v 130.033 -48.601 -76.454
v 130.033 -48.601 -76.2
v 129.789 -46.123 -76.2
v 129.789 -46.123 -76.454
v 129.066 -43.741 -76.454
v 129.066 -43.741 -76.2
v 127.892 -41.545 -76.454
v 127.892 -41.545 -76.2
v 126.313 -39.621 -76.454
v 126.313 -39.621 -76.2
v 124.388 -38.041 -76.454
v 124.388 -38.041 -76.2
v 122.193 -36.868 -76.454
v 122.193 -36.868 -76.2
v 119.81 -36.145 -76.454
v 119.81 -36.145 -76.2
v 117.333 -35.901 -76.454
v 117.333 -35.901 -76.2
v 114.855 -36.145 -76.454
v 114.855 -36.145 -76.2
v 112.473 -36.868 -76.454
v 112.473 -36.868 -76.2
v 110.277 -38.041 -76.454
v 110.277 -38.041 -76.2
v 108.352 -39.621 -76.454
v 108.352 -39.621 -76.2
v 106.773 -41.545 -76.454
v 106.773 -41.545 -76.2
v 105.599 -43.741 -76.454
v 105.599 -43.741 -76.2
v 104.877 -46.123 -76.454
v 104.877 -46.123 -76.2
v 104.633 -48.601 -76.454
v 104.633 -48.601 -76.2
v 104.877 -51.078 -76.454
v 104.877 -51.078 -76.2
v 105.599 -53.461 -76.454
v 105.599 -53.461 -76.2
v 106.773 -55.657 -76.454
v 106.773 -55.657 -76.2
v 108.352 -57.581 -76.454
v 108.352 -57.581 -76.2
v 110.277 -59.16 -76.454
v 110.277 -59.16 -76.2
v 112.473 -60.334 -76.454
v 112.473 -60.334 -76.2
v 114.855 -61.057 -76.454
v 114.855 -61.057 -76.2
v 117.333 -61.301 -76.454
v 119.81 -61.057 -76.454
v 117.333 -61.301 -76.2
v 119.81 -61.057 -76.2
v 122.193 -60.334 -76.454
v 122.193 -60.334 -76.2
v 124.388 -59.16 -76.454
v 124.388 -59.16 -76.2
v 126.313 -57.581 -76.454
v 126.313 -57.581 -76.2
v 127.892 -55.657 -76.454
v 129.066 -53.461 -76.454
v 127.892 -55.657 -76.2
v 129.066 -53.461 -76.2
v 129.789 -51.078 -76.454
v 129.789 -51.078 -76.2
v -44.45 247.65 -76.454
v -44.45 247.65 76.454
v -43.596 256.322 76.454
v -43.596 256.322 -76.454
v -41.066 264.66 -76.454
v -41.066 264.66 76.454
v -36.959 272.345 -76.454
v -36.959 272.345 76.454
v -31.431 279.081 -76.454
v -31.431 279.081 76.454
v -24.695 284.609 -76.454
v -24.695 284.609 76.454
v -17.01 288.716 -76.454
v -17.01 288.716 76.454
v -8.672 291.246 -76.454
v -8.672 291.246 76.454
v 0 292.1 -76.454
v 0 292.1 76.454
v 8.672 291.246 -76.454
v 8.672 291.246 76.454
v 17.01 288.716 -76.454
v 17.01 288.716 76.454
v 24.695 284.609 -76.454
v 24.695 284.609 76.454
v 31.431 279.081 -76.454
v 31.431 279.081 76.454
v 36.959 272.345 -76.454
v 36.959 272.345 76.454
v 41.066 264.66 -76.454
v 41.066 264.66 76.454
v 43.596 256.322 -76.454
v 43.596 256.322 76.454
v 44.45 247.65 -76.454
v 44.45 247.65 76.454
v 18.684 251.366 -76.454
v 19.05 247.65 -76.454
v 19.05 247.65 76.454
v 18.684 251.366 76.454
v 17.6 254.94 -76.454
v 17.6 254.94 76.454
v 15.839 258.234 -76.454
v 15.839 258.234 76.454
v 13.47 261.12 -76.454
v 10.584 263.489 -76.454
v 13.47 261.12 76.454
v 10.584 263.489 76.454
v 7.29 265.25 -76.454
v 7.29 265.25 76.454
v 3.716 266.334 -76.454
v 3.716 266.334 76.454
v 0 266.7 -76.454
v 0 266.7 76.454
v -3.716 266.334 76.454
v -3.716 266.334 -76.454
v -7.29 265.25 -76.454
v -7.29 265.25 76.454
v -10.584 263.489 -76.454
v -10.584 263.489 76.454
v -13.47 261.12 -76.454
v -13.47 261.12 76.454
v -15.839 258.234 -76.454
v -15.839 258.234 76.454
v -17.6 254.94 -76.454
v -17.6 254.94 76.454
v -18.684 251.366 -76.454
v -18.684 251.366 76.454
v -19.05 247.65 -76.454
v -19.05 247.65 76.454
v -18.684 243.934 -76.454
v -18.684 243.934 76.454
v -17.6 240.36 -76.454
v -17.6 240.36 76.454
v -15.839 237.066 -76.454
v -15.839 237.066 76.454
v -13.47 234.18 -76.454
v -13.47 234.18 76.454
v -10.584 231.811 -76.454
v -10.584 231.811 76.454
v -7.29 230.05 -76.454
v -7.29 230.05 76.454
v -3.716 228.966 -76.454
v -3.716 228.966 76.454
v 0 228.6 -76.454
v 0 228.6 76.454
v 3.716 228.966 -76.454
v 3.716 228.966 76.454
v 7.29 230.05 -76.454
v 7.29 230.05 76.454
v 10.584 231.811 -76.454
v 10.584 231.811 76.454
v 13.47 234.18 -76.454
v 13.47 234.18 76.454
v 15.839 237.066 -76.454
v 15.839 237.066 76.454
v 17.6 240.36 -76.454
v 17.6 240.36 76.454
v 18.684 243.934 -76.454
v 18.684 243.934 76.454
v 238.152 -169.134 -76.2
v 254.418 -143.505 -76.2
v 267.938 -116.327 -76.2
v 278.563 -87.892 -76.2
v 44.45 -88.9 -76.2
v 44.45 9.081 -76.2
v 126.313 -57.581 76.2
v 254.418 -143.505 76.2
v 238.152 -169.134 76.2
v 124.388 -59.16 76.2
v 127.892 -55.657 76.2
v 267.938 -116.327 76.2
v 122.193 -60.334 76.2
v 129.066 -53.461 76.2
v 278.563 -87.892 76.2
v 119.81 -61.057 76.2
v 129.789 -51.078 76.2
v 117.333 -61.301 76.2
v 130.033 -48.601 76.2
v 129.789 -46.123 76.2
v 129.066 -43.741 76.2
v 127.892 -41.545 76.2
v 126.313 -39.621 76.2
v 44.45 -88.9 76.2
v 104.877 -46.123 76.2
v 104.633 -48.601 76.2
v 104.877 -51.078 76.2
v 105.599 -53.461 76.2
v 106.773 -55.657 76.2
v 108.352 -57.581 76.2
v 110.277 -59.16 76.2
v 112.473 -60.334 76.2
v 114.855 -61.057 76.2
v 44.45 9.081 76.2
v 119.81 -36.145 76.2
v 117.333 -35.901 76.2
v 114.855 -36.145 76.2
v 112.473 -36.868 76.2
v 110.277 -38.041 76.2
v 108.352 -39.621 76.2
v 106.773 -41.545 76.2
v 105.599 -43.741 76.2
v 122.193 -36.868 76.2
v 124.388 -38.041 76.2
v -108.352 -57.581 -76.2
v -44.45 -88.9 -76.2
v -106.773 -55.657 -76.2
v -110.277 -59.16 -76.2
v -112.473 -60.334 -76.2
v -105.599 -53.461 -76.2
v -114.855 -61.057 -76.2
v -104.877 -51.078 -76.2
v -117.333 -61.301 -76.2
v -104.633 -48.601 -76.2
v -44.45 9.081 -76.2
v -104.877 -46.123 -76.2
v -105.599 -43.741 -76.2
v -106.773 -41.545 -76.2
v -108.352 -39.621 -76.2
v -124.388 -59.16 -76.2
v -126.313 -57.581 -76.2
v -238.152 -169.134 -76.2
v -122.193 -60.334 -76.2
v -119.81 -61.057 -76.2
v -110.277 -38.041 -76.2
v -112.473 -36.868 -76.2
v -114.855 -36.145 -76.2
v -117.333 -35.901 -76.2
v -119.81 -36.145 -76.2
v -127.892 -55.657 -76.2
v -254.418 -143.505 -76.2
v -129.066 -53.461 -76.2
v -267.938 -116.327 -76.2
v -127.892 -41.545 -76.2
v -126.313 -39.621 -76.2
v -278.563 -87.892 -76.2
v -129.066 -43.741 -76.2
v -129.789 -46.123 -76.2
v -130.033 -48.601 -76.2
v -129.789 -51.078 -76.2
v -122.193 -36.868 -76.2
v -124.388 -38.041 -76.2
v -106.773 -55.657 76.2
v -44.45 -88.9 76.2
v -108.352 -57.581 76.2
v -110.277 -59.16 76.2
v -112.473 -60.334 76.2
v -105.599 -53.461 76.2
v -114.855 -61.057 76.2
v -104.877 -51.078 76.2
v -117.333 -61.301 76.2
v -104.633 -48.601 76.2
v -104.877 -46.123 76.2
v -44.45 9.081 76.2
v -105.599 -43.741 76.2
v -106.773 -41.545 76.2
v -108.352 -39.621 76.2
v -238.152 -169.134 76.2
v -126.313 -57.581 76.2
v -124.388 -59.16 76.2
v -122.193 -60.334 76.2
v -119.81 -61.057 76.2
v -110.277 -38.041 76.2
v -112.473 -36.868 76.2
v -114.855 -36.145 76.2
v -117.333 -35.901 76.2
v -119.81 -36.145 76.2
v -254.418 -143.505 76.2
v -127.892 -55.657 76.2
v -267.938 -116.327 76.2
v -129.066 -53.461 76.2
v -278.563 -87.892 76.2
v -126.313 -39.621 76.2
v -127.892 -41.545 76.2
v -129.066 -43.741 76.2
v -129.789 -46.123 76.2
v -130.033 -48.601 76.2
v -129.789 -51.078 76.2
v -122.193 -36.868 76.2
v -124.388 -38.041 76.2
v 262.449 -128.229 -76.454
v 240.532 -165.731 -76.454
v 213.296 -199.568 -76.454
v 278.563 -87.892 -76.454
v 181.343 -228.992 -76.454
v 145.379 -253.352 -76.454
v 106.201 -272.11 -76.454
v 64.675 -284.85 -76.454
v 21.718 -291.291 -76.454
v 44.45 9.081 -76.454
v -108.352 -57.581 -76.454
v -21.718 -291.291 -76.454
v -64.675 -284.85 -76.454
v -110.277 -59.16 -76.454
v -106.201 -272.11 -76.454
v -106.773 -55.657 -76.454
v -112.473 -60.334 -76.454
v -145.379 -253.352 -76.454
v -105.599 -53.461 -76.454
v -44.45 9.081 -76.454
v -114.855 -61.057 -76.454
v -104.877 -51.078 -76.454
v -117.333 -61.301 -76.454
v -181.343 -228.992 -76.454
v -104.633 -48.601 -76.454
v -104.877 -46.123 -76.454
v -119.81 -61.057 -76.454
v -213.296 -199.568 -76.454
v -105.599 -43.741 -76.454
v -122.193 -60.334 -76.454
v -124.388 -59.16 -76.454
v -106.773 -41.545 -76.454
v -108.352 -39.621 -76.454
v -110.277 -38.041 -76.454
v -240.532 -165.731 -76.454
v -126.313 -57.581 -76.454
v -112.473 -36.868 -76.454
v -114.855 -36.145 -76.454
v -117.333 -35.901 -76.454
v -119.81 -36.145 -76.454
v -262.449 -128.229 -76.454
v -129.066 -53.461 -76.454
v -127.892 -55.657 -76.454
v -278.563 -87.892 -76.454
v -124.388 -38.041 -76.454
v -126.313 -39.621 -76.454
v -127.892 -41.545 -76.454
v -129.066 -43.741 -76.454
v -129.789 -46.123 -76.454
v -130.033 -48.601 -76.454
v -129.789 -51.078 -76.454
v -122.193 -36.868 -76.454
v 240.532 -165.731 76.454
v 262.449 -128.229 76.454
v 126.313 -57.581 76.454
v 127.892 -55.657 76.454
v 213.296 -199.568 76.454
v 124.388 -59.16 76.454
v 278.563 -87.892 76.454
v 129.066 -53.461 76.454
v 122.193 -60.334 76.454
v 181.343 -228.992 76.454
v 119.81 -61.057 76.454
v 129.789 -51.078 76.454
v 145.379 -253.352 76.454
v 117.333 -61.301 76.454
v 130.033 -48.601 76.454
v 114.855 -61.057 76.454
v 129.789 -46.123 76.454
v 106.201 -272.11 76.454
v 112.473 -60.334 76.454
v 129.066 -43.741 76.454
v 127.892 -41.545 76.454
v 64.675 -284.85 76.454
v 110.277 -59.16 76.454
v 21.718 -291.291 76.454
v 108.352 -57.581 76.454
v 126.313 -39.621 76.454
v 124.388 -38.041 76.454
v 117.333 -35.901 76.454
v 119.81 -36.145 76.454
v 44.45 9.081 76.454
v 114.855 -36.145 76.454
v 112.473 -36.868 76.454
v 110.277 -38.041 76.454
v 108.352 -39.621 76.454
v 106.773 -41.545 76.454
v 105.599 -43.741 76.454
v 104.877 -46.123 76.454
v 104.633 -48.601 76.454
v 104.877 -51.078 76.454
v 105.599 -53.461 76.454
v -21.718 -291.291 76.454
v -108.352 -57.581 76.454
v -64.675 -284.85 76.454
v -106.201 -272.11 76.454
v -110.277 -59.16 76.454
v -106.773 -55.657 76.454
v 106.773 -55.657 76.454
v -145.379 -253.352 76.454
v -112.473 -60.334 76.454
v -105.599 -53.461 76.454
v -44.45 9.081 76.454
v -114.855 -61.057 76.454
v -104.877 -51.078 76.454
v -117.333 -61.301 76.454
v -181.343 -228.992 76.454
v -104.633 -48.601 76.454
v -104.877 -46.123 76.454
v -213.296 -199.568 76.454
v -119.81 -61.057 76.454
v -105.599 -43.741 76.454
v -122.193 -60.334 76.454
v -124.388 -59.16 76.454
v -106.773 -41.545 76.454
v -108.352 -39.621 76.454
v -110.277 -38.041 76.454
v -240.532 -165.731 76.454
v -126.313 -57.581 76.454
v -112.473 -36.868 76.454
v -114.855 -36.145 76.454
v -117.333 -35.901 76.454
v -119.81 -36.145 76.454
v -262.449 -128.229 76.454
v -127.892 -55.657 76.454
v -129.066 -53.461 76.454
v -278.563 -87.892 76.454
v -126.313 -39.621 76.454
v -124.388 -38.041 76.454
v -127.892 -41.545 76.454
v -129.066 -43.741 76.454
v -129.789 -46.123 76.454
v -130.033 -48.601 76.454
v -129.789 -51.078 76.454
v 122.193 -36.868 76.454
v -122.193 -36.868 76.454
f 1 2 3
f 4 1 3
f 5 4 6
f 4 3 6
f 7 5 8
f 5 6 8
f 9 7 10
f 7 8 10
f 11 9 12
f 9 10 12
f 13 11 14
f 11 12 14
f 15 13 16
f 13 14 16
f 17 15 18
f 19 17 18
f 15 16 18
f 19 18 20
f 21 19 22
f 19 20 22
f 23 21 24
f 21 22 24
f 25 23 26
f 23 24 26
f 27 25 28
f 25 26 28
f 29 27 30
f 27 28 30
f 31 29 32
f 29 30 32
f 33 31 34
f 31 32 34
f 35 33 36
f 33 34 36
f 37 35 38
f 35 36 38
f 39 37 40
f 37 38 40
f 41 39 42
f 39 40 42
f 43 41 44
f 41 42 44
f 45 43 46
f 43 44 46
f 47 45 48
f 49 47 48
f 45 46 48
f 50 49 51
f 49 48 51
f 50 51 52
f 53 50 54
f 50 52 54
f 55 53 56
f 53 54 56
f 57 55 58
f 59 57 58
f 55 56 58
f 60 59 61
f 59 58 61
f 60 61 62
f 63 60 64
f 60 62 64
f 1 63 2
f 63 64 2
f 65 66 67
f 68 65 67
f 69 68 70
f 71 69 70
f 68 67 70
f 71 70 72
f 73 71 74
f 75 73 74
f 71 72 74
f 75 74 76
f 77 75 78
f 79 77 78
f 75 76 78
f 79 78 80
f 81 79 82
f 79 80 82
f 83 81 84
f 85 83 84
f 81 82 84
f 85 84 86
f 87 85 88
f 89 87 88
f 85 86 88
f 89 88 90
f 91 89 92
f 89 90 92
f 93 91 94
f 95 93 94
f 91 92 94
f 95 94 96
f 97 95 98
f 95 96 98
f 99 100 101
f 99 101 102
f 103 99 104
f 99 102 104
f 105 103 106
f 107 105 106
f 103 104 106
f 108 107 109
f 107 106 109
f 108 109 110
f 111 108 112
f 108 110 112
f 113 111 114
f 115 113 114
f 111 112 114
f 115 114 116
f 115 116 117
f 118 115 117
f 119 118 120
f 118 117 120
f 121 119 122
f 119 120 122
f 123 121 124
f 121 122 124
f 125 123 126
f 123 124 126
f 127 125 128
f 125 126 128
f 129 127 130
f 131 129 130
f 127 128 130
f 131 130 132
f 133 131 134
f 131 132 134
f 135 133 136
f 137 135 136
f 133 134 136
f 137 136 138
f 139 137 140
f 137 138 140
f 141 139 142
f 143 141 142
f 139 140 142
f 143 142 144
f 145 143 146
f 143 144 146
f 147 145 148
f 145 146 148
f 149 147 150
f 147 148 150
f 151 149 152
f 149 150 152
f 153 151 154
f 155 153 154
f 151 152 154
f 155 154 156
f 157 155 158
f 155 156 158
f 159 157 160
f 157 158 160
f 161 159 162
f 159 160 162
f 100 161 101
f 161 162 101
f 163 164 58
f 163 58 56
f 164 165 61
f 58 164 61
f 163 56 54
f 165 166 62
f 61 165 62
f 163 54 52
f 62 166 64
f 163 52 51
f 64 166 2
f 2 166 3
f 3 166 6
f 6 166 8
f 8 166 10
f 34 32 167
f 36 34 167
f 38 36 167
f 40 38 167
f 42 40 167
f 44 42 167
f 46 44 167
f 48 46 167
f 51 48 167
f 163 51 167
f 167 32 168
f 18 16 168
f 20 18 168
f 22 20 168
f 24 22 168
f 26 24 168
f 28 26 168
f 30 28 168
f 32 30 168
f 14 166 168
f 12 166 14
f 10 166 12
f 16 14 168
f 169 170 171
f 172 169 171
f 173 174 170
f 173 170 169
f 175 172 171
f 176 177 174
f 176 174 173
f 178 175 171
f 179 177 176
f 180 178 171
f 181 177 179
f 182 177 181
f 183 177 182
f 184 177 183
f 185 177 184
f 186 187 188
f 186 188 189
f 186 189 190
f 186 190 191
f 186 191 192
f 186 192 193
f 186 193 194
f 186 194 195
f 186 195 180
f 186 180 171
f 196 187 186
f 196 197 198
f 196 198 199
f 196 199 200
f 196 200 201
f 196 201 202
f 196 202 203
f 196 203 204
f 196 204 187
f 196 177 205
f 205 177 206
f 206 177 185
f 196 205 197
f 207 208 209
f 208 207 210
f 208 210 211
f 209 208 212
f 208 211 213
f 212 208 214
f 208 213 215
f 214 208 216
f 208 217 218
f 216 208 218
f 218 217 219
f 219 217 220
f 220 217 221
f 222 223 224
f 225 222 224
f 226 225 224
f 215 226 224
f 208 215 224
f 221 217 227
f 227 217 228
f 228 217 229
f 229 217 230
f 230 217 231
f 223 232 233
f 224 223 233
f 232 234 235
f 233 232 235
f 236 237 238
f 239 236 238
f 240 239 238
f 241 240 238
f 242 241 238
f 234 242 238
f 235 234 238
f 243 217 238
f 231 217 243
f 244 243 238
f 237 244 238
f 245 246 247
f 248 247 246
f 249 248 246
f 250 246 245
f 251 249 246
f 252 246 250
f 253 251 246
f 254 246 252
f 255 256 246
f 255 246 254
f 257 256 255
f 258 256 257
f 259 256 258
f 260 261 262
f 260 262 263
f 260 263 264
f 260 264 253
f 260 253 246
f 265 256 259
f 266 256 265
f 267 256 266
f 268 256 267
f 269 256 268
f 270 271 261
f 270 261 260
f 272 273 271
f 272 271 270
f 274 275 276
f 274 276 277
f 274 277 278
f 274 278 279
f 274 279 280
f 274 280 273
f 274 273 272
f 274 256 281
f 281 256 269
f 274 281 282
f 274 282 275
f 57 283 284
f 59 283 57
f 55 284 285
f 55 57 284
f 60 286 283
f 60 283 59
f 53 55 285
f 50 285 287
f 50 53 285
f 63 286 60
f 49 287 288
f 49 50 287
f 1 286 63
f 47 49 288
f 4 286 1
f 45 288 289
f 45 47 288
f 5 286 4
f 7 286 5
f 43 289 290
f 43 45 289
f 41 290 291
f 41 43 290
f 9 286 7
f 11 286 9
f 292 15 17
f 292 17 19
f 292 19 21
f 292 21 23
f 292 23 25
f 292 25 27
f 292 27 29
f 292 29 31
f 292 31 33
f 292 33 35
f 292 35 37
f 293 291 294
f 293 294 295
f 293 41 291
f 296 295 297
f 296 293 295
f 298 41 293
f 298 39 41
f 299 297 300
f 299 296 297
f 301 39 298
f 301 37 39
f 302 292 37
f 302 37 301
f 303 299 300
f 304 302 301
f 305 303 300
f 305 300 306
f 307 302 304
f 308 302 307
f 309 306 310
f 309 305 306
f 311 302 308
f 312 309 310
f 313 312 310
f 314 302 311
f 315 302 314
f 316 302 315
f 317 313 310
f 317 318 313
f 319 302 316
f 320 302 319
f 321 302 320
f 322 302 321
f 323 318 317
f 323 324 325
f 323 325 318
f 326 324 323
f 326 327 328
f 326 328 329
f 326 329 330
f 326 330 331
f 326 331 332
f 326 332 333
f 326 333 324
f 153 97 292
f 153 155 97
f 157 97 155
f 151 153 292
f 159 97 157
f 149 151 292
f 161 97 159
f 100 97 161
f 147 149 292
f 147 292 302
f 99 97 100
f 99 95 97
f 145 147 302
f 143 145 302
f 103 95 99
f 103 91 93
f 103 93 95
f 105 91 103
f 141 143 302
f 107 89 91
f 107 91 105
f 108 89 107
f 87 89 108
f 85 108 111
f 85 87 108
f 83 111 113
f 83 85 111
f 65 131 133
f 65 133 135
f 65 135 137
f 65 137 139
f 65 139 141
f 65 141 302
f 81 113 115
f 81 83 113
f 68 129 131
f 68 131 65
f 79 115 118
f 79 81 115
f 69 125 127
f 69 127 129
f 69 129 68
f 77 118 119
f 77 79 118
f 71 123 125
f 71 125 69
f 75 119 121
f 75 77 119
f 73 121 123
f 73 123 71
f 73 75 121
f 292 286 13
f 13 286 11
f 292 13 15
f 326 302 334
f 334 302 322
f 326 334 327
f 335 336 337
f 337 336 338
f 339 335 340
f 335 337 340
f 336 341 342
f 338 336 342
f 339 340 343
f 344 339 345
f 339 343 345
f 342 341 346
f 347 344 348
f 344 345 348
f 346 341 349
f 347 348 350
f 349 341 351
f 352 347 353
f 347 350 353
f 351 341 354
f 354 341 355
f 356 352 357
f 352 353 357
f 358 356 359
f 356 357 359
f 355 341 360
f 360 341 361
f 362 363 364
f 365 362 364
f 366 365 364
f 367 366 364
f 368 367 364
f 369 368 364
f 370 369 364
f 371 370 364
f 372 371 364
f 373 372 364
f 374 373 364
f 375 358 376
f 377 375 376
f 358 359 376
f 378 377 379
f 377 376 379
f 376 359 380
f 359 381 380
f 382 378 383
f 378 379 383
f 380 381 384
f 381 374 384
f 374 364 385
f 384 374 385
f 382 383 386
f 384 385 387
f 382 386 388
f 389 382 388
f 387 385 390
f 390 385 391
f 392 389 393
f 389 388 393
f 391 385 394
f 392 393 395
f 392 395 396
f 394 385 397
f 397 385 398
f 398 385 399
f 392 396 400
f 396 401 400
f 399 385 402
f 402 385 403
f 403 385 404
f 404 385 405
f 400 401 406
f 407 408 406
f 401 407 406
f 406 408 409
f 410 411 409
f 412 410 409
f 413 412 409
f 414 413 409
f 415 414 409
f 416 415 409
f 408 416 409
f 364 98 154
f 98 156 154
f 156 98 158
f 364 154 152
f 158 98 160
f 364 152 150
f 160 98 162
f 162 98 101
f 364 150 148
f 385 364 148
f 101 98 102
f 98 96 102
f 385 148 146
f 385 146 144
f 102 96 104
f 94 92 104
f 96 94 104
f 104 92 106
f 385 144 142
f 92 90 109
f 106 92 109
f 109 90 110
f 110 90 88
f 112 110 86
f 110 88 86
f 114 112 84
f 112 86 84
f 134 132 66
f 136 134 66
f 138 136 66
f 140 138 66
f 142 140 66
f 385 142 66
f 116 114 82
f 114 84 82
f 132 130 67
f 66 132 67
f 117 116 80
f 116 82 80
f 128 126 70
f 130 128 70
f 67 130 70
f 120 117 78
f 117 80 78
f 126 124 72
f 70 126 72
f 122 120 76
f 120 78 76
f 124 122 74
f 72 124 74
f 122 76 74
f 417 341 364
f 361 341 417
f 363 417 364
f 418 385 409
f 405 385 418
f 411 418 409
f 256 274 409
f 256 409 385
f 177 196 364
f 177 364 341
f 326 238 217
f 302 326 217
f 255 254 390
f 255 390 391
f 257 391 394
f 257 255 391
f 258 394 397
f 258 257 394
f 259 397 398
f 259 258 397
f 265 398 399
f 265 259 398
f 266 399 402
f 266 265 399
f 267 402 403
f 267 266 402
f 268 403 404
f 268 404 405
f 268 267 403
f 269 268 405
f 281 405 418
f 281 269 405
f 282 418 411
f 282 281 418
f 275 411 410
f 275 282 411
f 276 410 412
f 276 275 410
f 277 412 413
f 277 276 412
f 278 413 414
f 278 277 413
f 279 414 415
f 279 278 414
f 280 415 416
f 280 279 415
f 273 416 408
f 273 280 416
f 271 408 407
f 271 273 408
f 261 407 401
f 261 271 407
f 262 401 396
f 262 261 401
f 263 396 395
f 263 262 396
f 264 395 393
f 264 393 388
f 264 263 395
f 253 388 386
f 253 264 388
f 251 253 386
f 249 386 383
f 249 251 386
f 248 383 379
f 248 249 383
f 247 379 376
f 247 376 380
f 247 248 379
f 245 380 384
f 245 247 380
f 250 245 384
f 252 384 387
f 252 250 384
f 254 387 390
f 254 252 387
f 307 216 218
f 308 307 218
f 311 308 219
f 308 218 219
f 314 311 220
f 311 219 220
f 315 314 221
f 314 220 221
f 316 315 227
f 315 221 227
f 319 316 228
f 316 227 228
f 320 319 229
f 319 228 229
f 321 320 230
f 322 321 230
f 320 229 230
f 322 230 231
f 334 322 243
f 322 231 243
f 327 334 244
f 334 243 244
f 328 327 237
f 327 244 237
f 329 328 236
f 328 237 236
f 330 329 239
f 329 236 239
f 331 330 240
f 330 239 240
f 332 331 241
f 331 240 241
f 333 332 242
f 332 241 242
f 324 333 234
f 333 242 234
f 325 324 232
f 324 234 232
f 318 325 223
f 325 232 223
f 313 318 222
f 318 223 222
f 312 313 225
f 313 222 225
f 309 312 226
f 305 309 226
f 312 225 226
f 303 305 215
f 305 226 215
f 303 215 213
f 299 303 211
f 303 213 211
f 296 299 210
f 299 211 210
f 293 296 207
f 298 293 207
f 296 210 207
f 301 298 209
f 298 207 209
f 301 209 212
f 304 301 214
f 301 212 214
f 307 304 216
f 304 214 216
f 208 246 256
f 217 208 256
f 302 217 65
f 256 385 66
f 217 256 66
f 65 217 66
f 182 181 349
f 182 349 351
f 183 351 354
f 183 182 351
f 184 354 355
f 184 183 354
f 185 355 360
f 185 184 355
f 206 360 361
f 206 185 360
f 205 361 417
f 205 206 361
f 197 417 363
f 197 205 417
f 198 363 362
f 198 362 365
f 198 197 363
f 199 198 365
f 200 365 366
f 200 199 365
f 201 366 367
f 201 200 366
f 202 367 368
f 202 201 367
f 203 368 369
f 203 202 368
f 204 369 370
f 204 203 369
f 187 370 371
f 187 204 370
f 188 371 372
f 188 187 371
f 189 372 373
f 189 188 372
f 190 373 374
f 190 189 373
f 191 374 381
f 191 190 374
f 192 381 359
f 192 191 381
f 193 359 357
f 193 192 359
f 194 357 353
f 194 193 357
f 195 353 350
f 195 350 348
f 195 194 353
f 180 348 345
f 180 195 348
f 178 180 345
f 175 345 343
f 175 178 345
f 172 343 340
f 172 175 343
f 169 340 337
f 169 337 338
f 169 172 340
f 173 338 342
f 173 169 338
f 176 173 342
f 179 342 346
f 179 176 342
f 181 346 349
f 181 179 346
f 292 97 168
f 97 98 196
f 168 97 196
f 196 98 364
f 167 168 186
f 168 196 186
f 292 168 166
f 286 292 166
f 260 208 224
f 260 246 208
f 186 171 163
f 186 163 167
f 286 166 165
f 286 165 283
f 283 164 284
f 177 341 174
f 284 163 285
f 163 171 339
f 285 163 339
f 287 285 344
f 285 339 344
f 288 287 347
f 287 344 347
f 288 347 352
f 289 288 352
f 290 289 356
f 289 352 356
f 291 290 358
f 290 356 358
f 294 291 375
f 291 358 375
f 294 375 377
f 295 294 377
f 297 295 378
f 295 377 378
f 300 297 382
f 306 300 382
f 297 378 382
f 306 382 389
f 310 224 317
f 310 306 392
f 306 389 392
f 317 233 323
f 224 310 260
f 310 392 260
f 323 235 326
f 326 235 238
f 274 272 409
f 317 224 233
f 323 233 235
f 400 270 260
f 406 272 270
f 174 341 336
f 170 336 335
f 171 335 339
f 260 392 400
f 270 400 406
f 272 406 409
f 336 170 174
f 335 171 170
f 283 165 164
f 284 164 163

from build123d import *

# Parameters (mm, degrees)
SKETCH1_R           = 19.05
BOSS_EXTRUDE2_DEPTH = 76.2
SKETCH3_R           = 12.7
SKETCH3_R_2         = 19.05
BOSS_EXTRUDE4_DEPTH = 0.254


with BuildPart() as part:
    # Sketch1 → Boss-Extrude2 (new body, symmetric)
    with BuildSketch(Plane.XY):
        with BuildLine():
            Line((-44.45, -88.9), (-238.151556269, -169.13381166))
            ThreePointArc((-238.151556269, -169.13381166), (0, -292.1), (238.151556269, -169.13381166))
            Line((238.151556269, -169.13381166), (44.45, -88.9))
            Line((44.45, -88.9), (44.45, 247.65))
            ThreePointArc((44.45, 247.65), (0, 292.1), (-44.45, 247.65))
            Line((-44.45, 247.65), (-44.45, -88.9))
        make_face()
        with Locations((0, 247.65)):
            Circle(SKETCH1_R, mode=Mode.SUBTRACT)
    extrude(amount=BOSS_EXTRUDE2_DEPTH, both=True)

    # Sketch3 → Boss-Extrude4 (add)
    with BuildSketch(Plane.XY.offset(76.2)):
        with BuildLine():
            Line((44.45, 247.65), (44.45, 9.08096904))
            Line((44.45, 9.08096904), (278.563150245, -87.891872921))
            ThreePointArc((278.563150245, -87.891872921), (0, -292.1), (-278.563150245, -87.891872921))
            Line((-278.563150245, -87.891872921), (-44.45, 9.08096904))
            Line((-44.45, 9.08096904), (-44.45, 247.65))
            ThreePointArc((-44.45, 247.65), (0, 292.1), (44.45, 247.65))
        make_face()
        with Locations((-117.332700629, -48.60079591)):
            Circle(SKETCH3_R, mode=Mode.SUBTRACT)
        with Locations((117.332700629, -48.60079591)):
            Circle(SKETCH3_R, mode=Mode.SUBTRACT)
        with Locations((0, 247.65)):
            Circle(SKETCH3_R_2, mode=Mode.SUBTRACT)
    boss_extrude4 = extrude(amount=BOSS_EXTRUDE4_DEPTH)

    # Mirror4: Boss-Extrude4 across plane
    add(boss_extrude4.mirror(Plane.XY))


solid = part.part
